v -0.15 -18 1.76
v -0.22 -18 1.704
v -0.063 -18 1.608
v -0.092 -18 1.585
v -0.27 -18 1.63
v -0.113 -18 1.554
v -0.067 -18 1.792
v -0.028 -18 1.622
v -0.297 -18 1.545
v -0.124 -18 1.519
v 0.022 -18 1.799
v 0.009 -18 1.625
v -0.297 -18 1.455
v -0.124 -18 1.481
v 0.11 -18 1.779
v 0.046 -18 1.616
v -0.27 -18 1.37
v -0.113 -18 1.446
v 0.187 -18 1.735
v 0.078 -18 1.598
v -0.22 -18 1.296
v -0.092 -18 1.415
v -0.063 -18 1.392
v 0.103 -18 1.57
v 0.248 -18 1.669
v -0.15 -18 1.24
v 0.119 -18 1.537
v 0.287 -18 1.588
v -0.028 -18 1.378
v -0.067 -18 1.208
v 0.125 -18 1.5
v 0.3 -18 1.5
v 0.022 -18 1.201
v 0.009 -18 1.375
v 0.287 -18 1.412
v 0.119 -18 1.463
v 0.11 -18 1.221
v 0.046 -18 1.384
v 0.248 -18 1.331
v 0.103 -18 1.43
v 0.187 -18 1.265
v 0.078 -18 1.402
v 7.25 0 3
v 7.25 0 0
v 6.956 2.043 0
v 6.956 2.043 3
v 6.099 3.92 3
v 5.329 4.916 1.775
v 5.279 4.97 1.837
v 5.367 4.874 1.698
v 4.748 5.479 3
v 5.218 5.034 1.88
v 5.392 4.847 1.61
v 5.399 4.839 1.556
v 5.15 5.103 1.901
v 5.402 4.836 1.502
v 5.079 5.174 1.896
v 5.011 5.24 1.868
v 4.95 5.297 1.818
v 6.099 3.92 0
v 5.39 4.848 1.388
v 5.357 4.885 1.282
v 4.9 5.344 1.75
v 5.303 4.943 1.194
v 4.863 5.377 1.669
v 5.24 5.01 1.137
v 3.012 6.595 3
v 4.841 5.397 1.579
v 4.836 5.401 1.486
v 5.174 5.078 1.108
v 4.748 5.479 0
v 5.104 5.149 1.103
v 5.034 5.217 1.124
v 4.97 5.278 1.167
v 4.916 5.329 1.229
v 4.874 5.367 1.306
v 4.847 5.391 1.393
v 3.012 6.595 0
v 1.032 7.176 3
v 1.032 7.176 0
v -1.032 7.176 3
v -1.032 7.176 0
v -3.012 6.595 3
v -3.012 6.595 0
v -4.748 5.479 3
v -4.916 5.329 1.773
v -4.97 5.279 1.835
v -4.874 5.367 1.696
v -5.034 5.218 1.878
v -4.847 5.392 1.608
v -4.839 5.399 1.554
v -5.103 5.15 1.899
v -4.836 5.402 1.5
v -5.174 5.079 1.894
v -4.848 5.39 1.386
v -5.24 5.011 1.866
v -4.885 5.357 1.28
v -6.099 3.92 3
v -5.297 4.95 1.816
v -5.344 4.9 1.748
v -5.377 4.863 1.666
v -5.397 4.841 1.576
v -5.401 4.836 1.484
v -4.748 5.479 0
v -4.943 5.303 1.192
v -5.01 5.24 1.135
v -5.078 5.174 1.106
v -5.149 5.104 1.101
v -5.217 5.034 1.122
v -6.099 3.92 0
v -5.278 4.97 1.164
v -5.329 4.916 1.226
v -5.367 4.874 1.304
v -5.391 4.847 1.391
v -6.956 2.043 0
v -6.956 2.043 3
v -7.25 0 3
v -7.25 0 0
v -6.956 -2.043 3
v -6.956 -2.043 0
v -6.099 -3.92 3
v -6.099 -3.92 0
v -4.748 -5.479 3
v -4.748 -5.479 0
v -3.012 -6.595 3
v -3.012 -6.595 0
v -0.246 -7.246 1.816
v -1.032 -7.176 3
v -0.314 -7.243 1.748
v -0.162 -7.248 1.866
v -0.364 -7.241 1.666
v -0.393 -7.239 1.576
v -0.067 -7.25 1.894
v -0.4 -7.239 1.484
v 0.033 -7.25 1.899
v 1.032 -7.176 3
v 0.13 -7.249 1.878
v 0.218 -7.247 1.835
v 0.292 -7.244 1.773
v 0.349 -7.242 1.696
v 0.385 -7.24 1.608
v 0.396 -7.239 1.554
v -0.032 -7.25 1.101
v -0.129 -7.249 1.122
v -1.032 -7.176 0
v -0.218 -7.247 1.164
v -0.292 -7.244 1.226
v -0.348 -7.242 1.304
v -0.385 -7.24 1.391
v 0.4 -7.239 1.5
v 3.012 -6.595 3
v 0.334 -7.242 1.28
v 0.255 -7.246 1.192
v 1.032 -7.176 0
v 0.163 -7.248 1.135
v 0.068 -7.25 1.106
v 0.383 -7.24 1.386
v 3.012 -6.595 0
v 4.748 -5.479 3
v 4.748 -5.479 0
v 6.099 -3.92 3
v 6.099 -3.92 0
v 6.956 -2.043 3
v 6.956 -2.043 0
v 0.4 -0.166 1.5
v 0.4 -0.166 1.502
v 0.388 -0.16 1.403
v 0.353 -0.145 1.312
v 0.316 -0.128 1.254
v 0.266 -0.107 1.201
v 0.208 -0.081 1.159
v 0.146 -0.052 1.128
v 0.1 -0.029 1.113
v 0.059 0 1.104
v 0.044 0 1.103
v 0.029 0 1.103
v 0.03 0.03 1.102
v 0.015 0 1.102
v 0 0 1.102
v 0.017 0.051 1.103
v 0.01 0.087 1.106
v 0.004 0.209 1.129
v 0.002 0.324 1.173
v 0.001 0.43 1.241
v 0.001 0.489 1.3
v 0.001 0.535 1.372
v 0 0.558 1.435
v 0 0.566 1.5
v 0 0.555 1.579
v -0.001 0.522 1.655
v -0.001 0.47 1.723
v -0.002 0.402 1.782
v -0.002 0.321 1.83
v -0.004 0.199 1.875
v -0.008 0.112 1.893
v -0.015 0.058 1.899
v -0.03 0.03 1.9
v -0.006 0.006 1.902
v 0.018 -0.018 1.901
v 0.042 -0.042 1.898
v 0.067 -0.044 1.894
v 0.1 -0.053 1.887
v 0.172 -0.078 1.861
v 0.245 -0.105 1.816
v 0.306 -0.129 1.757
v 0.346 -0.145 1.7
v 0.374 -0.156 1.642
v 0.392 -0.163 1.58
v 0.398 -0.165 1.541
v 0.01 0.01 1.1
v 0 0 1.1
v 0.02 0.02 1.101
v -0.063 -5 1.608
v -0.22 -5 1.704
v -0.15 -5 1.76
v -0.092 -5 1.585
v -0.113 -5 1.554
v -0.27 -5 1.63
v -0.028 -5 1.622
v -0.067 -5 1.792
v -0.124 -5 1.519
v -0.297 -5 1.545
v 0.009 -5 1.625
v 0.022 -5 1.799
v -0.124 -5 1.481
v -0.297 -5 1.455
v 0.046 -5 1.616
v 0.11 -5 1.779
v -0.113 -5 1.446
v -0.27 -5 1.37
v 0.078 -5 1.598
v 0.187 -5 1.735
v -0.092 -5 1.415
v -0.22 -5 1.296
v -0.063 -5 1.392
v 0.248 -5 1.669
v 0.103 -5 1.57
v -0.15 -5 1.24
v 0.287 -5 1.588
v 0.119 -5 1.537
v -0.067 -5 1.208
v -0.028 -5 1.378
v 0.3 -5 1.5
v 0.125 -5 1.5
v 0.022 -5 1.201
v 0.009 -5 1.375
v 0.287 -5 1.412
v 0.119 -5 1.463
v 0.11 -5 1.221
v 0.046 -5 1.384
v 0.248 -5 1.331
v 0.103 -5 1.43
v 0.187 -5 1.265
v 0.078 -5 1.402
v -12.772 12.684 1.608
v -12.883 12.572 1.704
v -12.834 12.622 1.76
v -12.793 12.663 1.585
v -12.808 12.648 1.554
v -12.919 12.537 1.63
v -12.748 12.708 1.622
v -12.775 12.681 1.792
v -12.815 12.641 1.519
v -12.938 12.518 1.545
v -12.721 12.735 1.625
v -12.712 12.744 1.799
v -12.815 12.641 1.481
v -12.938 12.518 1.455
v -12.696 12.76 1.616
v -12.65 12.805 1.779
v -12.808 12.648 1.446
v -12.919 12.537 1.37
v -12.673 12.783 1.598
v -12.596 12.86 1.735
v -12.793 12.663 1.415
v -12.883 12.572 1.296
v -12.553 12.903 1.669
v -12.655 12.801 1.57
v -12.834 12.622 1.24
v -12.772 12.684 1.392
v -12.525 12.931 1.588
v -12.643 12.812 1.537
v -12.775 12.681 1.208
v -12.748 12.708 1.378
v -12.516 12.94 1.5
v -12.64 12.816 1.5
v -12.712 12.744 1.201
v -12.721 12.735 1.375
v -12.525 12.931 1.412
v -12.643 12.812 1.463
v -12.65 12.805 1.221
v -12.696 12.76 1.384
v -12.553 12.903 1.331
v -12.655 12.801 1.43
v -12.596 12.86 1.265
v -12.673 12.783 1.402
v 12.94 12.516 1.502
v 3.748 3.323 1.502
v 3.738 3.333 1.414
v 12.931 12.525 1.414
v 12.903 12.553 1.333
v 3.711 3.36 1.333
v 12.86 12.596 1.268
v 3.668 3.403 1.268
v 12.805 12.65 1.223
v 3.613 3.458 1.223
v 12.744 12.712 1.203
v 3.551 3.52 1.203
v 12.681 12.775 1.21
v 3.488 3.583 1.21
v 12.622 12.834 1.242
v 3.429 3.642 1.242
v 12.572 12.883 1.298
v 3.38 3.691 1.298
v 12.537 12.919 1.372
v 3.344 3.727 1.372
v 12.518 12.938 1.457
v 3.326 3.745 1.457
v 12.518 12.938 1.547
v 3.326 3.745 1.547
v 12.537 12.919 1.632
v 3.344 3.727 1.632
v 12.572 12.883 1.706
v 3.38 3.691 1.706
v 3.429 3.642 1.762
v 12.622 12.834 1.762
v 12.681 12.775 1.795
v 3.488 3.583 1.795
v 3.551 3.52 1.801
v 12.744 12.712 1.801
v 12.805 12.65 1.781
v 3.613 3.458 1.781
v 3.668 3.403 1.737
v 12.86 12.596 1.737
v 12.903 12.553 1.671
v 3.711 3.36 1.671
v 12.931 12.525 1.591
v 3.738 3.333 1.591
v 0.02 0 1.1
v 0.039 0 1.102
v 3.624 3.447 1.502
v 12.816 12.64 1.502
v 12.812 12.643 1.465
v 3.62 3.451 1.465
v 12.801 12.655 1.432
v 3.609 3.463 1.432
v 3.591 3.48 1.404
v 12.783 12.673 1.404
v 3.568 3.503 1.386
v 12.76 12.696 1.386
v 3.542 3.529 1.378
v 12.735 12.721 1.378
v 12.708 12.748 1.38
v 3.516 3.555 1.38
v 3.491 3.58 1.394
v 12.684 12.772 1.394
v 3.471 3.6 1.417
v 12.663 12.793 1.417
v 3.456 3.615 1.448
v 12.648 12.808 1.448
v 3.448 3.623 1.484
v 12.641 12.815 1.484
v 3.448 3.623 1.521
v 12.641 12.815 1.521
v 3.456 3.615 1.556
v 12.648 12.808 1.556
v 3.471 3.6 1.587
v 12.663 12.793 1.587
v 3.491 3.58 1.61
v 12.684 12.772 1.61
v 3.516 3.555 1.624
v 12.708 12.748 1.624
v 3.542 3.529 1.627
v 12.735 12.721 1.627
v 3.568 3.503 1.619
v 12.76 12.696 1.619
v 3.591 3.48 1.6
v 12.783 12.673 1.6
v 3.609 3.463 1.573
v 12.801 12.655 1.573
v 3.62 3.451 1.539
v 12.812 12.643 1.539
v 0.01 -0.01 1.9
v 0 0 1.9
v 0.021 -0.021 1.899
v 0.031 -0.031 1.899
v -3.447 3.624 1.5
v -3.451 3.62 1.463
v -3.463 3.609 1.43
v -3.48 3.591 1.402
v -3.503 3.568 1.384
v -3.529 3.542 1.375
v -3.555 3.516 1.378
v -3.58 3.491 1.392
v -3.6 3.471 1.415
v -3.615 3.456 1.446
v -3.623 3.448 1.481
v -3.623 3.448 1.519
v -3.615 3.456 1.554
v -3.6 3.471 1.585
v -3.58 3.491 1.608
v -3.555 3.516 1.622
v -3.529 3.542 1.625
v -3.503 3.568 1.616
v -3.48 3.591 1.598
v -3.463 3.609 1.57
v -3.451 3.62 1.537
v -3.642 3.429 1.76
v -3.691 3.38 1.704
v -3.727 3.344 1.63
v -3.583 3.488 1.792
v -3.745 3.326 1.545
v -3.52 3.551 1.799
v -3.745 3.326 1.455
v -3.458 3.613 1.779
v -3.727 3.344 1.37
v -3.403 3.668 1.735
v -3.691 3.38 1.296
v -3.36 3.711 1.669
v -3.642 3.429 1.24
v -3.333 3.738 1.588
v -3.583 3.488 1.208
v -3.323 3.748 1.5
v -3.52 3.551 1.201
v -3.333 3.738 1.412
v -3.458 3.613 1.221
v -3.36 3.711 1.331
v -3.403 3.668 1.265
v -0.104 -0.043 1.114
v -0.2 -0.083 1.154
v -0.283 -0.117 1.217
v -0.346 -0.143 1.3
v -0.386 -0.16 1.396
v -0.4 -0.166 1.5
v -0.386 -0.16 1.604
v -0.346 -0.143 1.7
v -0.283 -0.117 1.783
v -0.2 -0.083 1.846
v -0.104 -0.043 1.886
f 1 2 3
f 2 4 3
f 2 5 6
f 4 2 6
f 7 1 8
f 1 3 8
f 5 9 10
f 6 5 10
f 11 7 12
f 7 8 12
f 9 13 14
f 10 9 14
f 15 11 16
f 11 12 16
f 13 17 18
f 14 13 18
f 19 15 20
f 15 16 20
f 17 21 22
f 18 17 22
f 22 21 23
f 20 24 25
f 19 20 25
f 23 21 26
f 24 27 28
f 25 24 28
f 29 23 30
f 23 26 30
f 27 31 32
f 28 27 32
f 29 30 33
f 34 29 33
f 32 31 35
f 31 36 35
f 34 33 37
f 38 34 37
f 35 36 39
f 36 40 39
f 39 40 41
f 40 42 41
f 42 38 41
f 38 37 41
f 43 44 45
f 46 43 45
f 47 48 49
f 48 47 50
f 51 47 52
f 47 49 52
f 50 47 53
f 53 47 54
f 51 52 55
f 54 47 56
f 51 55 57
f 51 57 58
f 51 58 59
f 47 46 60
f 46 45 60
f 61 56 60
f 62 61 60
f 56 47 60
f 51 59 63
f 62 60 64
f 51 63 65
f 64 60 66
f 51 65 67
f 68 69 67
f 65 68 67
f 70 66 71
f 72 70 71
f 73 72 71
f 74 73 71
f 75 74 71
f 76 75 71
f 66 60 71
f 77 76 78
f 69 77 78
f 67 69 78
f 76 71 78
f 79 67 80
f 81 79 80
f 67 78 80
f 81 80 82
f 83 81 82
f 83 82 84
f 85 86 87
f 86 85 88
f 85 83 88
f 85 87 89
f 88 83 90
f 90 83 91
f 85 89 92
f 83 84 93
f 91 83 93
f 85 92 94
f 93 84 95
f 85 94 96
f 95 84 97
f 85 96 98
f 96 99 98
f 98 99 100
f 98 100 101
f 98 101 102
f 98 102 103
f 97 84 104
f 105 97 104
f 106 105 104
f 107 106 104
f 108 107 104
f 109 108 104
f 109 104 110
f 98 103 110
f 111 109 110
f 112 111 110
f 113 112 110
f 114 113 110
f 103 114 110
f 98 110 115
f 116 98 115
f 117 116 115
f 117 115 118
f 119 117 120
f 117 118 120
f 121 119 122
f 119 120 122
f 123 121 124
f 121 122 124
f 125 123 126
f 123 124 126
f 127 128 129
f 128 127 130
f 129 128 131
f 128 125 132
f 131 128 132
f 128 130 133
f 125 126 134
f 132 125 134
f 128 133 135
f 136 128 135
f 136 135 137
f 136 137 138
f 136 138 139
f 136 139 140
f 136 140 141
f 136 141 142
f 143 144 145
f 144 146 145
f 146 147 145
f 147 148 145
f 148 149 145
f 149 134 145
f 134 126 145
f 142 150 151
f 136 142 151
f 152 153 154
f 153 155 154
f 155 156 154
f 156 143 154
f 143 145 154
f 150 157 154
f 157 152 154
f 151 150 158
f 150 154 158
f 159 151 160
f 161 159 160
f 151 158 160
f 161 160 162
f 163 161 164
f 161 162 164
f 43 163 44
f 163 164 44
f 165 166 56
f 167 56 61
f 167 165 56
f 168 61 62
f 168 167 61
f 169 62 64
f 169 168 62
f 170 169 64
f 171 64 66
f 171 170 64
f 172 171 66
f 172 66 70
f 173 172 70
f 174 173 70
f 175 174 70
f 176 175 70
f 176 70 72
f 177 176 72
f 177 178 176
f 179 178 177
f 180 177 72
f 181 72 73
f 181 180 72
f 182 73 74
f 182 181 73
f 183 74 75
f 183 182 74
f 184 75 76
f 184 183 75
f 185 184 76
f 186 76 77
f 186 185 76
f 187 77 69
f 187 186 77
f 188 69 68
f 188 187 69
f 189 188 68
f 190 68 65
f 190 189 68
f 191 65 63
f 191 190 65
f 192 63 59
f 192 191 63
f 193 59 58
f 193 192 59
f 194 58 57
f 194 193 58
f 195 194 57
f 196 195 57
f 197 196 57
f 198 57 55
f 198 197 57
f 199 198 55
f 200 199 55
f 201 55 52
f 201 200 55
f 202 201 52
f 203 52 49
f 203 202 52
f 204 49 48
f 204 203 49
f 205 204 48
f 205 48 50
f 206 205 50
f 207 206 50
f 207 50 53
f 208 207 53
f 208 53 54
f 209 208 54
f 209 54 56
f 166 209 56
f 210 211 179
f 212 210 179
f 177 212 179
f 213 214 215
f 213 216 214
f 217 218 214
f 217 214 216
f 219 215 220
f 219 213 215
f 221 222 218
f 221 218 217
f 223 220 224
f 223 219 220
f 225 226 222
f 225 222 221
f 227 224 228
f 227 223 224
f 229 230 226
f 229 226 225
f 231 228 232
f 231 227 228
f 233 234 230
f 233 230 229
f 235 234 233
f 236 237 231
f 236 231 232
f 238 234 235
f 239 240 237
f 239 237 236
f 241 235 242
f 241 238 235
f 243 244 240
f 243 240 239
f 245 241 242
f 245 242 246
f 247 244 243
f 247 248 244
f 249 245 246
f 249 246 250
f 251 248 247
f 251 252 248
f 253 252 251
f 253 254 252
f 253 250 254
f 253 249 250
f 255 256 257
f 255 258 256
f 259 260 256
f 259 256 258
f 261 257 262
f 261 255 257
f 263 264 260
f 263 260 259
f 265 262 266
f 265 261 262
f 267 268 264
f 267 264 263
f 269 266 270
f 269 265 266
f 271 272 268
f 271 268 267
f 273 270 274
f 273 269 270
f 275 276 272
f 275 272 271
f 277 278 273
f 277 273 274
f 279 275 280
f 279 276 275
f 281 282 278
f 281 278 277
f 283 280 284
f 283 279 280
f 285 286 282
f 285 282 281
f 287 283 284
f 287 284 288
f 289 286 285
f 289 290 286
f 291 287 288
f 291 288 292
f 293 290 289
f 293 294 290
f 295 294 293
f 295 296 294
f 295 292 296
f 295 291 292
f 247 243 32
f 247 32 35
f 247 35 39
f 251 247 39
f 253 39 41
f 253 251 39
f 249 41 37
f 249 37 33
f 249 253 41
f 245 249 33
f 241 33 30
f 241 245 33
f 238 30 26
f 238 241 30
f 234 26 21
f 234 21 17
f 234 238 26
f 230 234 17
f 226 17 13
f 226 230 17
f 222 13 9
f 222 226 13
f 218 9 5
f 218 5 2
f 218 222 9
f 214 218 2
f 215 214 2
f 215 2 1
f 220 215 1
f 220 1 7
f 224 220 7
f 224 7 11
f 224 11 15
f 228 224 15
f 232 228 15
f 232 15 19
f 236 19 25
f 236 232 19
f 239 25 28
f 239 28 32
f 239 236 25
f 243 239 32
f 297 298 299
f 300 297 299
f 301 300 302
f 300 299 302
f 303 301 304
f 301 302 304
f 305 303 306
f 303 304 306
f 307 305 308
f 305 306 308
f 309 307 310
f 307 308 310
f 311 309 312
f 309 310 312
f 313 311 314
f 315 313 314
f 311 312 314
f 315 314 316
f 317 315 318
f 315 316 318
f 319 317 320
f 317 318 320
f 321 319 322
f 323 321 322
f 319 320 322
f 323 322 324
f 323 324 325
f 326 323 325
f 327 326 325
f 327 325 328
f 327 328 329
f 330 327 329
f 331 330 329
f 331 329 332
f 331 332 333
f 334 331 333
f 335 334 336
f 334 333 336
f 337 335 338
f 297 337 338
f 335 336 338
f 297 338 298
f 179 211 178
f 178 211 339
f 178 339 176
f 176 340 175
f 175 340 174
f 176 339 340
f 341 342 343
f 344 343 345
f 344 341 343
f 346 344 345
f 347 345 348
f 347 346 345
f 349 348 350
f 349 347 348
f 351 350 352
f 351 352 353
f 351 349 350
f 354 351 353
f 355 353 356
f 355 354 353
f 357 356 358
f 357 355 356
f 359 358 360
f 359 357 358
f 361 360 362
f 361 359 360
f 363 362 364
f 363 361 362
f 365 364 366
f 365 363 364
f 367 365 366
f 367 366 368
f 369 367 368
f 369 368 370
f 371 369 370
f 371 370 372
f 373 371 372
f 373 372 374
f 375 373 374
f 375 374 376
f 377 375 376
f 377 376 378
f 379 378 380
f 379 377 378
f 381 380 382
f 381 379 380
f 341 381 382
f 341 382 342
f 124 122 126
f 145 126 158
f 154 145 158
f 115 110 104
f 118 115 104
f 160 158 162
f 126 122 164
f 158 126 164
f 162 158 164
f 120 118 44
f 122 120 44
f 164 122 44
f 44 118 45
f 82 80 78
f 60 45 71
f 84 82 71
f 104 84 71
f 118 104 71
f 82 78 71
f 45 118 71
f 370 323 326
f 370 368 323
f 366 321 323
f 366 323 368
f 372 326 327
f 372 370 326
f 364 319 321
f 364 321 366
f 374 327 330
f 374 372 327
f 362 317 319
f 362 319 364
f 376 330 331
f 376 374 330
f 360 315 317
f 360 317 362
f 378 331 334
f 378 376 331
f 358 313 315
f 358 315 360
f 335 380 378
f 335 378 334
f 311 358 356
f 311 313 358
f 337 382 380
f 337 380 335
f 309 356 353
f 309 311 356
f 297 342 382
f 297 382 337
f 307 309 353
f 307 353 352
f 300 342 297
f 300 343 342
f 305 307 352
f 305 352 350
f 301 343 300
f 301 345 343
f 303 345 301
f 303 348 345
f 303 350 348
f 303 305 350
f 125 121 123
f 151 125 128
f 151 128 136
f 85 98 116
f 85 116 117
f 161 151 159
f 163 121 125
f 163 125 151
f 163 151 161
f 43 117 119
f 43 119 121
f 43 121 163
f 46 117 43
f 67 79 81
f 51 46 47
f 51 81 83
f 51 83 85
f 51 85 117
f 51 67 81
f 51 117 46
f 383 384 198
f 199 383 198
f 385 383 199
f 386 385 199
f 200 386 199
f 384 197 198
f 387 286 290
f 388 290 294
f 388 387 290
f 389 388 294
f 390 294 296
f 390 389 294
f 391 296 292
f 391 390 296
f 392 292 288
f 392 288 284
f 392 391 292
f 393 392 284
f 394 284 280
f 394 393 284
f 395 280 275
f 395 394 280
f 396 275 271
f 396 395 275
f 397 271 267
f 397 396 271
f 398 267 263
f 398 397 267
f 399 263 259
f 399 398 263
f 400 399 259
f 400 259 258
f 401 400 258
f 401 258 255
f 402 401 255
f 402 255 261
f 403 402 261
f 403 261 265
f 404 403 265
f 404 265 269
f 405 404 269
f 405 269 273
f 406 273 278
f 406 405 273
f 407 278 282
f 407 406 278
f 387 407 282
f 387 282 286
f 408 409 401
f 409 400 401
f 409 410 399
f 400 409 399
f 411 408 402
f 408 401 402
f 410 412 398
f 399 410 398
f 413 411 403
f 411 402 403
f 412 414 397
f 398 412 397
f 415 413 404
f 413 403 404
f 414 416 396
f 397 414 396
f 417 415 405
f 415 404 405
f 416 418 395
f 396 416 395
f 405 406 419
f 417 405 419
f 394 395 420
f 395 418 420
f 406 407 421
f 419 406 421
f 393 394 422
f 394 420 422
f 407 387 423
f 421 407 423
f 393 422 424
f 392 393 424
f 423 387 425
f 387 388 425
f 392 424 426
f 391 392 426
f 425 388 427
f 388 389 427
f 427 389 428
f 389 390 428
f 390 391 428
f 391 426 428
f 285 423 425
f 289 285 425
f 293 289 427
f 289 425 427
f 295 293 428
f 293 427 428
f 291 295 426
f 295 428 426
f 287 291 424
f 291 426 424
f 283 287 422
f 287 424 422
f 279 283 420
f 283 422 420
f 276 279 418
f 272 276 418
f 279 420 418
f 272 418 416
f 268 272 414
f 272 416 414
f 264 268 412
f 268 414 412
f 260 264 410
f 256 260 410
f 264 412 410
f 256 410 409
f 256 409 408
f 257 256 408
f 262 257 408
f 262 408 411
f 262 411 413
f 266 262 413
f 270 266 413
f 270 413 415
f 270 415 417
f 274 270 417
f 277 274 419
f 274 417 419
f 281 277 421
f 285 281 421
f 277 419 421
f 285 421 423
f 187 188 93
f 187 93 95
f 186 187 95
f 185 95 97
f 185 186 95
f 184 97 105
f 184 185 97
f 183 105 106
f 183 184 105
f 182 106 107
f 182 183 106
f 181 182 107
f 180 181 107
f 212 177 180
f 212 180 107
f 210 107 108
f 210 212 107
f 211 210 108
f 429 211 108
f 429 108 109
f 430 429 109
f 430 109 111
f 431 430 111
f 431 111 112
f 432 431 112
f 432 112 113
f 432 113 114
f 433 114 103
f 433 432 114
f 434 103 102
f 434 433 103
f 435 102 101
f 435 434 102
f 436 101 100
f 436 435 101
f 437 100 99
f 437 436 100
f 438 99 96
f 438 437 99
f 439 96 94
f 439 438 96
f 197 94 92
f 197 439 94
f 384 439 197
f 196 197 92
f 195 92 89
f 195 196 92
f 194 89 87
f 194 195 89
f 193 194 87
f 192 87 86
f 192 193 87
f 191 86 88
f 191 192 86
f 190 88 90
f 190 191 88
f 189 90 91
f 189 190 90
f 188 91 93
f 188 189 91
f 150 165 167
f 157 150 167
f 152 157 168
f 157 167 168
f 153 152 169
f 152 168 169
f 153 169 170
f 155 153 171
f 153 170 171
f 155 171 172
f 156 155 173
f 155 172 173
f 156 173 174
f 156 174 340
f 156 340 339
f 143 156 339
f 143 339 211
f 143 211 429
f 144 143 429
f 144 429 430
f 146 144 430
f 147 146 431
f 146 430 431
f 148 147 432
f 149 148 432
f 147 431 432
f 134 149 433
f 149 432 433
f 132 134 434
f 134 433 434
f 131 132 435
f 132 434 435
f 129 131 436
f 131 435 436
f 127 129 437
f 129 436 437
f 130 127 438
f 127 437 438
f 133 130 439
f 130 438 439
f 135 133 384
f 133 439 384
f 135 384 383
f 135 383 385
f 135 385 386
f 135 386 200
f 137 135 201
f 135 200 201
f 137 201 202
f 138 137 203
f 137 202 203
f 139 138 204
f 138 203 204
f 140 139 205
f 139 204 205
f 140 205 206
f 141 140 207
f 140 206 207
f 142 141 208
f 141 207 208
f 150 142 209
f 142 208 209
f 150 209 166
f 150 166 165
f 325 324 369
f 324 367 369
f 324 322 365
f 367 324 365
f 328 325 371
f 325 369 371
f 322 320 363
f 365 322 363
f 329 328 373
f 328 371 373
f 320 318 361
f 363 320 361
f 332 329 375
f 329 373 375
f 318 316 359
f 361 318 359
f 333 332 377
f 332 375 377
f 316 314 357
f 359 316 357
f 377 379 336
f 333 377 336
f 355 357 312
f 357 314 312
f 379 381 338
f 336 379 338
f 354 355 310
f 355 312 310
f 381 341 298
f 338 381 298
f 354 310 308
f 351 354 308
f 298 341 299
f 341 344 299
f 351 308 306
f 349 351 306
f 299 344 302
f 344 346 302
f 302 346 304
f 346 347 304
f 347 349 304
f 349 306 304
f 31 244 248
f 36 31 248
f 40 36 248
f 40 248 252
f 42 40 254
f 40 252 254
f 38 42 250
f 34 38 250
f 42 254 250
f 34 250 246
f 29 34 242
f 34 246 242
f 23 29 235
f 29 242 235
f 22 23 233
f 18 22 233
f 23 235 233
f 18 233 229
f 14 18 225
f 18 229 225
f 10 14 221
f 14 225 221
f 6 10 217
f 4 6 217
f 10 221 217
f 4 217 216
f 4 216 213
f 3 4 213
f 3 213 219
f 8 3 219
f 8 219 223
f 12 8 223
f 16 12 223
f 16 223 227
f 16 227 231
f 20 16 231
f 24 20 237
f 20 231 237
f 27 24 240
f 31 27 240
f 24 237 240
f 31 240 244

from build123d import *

# Parameters (mm, degrees)
SKETCH1_R           = 7.25
BOSS_EXTRUDE1_DEPTH = 3
CUT_EXTRUDE1_REACH  = 9.25
SKETCH2_R           = 0.4
CUT_EXTRUDE2_REACH  = 12.253
SKETCH3_R           = 0.4
CUT_EXTRUDE3_REACH  = 12.253
SKETCH4_R           = 0.4
BOSS_EXTRUDE2_START = 5
SKETCH5_R           = 0.3
SKETCH5_R_2         = 0.125
BOSS_EXTRUDE2_DEPTH = 13
BOSS_EXTRUDE3_START = 5
SKETCH6_R           = 0.3
SKETCH6_R_2         = 0.125
BOSS_EXTRUDE3_DEPTH = 13
BOSS_EXTRUDE4_START = -5
SKETCH7_R           = 0.3
SKETCH7_R_2         = 0.125
BOSS_EXTRUDE4_DEPTH = 13


with BuildPart() as part:
    # Sketch1 → Boss-Extrude1 (new body)
    with BuildSketch(Plane.XY):
        Circle(SKETCH1_R)
    extrude(amount=BOSS_EXTRUDE1_DEPTH)

    # Sketch2 → Cut-Extrude1 (cut, up to next)
    with BuildSketch(Plane(origin=(0, 0, 0), x_dir=(1, 0, 0), z_dir=(0, 1, 0)), mode=Mode.PRIVATE) as cut_extrude1_sk1:
        with Locations((0, -1.5)):
            Circle(SKETCH2_R)
    cut_extrude1_tool1 = extrude(cut_extrude1_sk1.sketch, amount=-CUT_EXTRUDE1_REACH, mode=Mode.PRIVATE) & part.part
    add(cut_extrude1_tool1.solids().sort_by_distance((0, 0, 1.5))[0], mode=Mode.SUBTRACT)

    # Sketch3 → Cut-Extrude2 (cut, up to next)
    with BuildSketch(Plane(origin=(0, 0, 0), x_dir=(0.707106781, 0.707106781, 0), z_dir=(-0.707106781, 0.707106781, 0)), mode=Mode.PRIVATE) as cut_extrude2_sk1:
        with Locations((0, -1.5)):
            Circle(SKETCH3_R)
    cut_extrude2_tool1 = extrude(cut_extrude2_sk1.sketch, amount=CUT_EXTRUDE2_REACH, mode=Mode.PRIVATE) & part.part
    add(cut_extrude2_tool1.solids().sort_by_distance((0, 0, 1.5))[0], mode=Mode.SUBTRACT)

    # Sketch4 → Cut-Extrude3 (cut, up to next)
    with BuildSketch(Plane(origin=(0, 0, 0), x_dir=(0.707106781, -0.707106781, 0), z_dir=(0.707106781, 0.707106781, 0)), mode=Mode.PRIVATE) as cut_extrude3_sk1:
        with Locations((0, -1.502186295)):
            Circle(SKETCH4_R)
    cut_extrude3_tool1 = extrude(cut_extrude3_sk1.sketch, amount=CUT_EXTRUDE3_REACH, mode=Mode.PRIVATE) & part.part
    add(cut_extrude3_tool1.solids().sort_by_distance((0, 0, 1.502186))[0], mode=Mode.SUBTRACT)


with BuildPart() as body_2:
    # Sketch5 → Boss-Extrude2 (new body)
    with BuildSketch(Plane(origin=(0, 0, 0), x_dir=(0.707106781, -0.707106781, 0), z_dir=(0.707106781, 0.707106781, 0)).offset(BOSS_EXTRUDE2_START)):
        with Locations((0, -1.502186295)):
            Circle(SKETCH5_R)
        with Locations((0, -1.502186295)):
            Circle(SKETCH5_R_2, mode=Mode.SUBTRACT)
    extrude(amount=BOSS_EXTRUDE2_DEPTH)


with BuildPart() as body_3:
    # Sketch6 → Boss-Extrude3 (new body)
    with BuildSketch(Plane(origin=(0, 0, 0), x_dir=(0.707106781, 0.707106781, 0), z_dir=(-0.707106781, 0.707106781, 0)).offset(BOSS_EXTRUDE3_START)):
        with Locations((0, -1.5)):
            Circle(SKETCH6_R)
        with Locations((0, -1.5)):
            Circle(SKETCH6_R_2, mode=Mode.SUBTRACT)
    extrude(amount=BOSS_EXTRUDE3_DEPTH)


with BuildPart() as body_4:
    # Sketch7 → Boss-Extrude4 (new body)
    with BuildSketch(Plane(origin=(0, 0, 0), x_dir=(1, 0, 0), z_dir=(0, 1, 0)).offset(BOSS_EXTRUDE4_START)):
        with Locations((0, -1.5)):
            Circle(SKETCH7_R)
        with Locations((0, -1.5)):
            Circle(SKETCH7_R_2, mode=Mode.SUBTRACT)
    extrude(amount=-BOSS_EXTRUDE4_DEPTH)


solid = Compound([part.part, body_2.part, body_3.part, body_4.part])
